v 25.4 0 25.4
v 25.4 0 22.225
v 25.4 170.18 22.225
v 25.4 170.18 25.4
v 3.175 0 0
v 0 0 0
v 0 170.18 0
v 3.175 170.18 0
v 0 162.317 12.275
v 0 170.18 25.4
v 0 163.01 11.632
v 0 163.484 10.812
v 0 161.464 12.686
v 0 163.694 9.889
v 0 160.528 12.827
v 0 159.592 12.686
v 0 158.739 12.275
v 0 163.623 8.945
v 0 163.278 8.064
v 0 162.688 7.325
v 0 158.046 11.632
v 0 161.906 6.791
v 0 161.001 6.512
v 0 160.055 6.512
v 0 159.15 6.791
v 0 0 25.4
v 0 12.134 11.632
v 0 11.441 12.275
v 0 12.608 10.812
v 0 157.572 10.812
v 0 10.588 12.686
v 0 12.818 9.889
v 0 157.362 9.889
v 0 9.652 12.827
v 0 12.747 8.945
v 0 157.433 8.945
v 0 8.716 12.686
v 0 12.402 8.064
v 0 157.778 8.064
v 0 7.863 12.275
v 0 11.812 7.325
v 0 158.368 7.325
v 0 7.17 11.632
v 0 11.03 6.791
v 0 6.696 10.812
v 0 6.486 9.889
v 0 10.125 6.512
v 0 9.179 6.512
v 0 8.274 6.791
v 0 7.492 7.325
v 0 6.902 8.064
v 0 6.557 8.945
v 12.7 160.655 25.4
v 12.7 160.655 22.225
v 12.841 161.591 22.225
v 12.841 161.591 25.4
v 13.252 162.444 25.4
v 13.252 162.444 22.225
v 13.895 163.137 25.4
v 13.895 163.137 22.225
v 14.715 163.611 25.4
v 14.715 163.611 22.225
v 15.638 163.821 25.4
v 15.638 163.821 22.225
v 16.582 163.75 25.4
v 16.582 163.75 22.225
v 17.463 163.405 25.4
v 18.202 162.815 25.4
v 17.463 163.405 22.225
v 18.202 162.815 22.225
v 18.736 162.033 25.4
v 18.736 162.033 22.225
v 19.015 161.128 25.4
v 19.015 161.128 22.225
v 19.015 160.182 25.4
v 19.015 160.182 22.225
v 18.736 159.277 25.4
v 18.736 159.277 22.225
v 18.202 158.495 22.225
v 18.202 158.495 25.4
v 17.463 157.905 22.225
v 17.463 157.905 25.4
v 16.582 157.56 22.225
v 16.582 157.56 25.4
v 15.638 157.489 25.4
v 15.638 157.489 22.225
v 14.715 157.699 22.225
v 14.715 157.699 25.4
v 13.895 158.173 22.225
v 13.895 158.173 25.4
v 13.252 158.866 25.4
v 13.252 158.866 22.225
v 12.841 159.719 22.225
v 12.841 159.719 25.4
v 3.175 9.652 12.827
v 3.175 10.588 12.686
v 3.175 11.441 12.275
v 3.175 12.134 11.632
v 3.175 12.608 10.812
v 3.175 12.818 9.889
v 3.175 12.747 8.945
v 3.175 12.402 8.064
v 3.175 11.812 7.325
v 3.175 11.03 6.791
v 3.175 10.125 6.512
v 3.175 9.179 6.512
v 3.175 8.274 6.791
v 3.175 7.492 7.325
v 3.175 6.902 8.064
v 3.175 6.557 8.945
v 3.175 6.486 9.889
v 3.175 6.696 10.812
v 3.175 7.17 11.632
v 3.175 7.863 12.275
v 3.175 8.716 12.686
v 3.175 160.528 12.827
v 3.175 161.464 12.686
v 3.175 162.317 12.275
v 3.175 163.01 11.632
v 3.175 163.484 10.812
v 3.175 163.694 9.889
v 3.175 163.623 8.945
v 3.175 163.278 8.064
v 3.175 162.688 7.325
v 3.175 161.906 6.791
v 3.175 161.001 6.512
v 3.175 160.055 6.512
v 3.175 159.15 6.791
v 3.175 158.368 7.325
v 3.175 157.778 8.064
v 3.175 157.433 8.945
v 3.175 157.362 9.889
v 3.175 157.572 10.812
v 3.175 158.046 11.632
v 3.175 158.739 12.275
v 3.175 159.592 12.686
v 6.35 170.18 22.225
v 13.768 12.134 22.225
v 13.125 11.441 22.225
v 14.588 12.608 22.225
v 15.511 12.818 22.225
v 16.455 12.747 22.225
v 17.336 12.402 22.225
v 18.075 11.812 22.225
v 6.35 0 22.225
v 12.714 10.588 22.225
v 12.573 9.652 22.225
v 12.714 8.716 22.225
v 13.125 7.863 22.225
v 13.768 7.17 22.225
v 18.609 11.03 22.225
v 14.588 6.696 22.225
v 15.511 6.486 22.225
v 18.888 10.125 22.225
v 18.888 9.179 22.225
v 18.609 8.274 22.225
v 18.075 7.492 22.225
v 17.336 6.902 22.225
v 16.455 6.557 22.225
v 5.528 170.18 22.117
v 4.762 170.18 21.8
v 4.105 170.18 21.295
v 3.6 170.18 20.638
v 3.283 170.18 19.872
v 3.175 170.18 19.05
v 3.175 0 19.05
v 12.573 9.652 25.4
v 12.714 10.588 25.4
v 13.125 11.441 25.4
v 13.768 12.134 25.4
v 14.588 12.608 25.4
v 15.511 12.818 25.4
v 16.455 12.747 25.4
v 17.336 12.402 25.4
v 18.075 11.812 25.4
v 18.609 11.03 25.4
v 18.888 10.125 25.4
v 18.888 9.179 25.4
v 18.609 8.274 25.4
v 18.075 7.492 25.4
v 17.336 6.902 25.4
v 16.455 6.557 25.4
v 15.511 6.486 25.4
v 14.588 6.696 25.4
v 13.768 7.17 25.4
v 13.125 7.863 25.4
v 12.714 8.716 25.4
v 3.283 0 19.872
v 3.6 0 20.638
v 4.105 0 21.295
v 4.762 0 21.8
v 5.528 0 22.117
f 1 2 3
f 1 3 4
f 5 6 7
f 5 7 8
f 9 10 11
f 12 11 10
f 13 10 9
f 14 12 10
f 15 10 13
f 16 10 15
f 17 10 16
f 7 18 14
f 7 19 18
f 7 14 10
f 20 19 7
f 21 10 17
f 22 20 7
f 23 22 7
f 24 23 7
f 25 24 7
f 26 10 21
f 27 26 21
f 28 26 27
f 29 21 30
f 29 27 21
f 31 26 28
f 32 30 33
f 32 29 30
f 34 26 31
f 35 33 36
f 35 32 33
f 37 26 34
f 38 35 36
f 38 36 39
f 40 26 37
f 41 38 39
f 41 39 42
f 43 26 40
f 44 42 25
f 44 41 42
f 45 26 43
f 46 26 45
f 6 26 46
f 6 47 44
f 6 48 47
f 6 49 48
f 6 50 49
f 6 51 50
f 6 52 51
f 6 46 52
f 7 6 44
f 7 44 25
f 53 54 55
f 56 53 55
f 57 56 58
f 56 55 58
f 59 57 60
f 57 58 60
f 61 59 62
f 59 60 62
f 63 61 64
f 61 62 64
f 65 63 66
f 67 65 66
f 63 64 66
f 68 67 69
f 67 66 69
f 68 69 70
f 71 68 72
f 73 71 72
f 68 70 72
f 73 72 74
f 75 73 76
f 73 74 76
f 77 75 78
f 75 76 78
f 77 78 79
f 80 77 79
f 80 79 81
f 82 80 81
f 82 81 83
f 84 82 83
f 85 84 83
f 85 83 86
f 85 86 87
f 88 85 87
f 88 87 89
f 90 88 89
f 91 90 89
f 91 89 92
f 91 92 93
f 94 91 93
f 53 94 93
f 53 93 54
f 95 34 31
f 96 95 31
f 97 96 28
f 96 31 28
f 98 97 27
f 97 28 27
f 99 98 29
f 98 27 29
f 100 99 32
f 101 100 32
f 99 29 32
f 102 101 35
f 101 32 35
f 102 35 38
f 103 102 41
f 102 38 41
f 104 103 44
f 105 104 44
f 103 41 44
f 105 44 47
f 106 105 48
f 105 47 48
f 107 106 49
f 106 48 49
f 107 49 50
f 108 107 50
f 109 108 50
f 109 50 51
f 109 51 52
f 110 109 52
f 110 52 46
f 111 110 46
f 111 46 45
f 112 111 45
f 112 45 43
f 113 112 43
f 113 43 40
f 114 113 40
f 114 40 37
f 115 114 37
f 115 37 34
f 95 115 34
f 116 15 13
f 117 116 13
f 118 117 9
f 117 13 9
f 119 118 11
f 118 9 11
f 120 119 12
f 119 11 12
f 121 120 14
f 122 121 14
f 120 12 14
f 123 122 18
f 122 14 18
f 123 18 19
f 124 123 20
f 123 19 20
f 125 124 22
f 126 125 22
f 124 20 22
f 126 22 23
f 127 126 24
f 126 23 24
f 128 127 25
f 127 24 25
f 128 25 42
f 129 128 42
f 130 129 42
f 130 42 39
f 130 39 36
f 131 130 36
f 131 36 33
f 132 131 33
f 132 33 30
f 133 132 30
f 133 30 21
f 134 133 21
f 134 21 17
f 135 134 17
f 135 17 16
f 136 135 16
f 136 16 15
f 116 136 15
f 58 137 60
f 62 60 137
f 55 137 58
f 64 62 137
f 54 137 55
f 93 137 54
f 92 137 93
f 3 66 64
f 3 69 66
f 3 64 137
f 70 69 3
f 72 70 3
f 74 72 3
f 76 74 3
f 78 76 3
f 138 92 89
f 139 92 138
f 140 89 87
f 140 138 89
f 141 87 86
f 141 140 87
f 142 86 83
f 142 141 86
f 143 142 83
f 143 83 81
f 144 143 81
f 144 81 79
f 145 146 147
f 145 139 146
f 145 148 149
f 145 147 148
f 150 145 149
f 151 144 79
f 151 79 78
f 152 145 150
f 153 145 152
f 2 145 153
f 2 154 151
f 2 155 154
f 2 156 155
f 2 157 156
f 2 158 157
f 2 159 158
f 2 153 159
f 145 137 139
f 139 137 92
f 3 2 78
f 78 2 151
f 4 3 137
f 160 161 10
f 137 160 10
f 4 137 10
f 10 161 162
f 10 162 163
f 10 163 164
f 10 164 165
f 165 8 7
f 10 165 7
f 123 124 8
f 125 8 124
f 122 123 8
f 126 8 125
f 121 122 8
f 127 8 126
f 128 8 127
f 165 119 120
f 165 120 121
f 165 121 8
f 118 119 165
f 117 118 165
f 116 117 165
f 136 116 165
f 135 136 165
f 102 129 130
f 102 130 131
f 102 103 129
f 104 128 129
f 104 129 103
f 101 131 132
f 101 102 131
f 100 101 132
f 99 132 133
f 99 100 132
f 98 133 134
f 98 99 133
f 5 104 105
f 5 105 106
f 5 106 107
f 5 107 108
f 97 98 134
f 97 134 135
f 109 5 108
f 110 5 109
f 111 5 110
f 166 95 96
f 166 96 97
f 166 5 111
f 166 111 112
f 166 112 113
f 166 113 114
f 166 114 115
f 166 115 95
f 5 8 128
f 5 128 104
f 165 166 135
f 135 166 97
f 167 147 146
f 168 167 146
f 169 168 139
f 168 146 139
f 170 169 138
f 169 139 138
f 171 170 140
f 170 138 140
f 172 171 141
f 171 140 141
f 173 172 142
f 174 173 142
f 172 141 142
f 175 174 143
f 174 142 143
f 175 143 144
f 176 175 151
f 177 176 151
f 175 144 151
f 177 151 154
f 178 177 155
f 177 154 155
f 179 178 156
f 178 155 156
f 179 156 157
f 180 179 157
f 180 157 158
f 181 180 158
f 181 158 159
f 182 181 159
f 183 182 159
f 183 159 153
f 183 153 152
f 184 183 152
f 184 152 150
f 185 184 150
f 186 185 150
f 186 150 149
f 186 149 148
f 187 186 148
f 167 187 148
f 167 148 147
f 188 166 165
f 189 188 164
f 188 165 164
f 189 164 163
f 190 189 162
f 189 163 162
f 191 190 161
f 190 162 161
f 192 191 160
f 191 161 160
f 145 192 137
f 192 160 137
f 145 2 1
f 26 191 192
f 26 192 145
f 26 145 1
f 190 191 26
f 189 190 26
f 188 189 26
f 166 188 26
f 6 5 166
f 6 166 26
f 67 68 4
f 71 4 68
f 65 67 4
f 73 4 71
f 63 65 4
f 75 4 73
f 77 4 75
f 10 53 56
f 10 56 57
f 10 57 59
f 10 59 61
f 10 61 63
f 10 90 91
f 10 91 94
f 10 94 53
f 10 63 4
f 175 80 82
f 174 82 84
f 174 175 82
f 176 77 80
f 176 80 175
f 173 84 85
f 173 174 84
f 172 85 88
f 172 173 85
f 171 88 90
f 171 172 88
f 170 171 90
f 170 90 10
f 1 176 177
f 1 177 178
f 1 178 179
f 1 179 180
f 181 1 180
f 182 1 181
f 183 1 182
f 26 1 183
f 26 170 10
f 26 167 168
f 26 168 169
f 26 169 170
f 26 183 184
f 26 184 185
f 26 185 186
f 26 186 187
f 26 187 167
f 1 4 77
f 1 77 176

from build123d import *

# Parameters (mm, degrees)
BOSS_EXTRUDE1_DEPTH = 170.18
FILLET1_R           = 3.175
SKETCH2_R           = 3.175
CUT_EXTRUDE1_DEPTH  = 174.929734088
SKETCH3_R           = 3.175
CUT_EXTRUDE2_DEPTH  = 174.929734088
SKETCH4_R           = 3.175
CUT_EXTRUDE3_DEPTH  = 174.494504308
SKETCH5_R           = 3.175
CUT_EXTRUDE4_DEPTH  = 174.494504308


with BuildPart() as part:
    # Sketch1 → Boss-Extrude1 (new body)
    with BuildSketch(Plane(origin=(0, 0, 0), x_dir=(1, 0, 0), z_dir=(0, 1, 0))):
        Polygon((0, 0), (3.175, 0), (3.175, -22.225), (25.4, -22.225), (25.4, -25.4), (0, -25.4), align=None)
    extrude(amount=BOSS_EXTRUDE1_DEPTH)

    # Fillet1
    fillet1_edges = [part.edges().sort_by_distance(p)[0] for p in [
        (3.175, 85.09, 22.225),
    ]]
    fillet(fillet1_edges, radius=FILLET1_R)

    # Sketch2 → Cut-Extrude1 (cut, through all)
    with BuildSketch(Plane.ZY):
        with Locations((9.652, 160.528)):
            Circle(SKETCH2_R)
    extrude(amount=-CUT_EXTRUDE1_DEPTH, mode=Mode.SUBTRACT)

    # Sketch3 → Cut-Extrude2 (cut, through all)
    with BuildSketch(Plane.ZY):
        with Locations((9.652, 9.652)):
            Circle(SKETCH3_R)
    extrude(amount=-CUT_EXTRUDE2_DEPTH, mode=Mode.SUBTRACT)

    # Sketch4 → Cut-Extrude3 (cut, through all)
    with BuildSketch(Plane(origin=(0, 0, 22.225), x_dir=(-1, 0, 0), z_dir=(0, 0, -1))):
        with Locations((-15.748, 9.652)):
            Circle(SKETCH4_R)
    extrude(amount=-CUT_EXTRUDE3_DEPTH, mode=Mode.SUBTRACT)

    # Sketch5 → Cut-Extrude4 (cut, through all)
    with BuildSketch(Plane(origin=(0, 0, 22.225), x_dir=(-1, 0, 0), z_dir=(0, 0, -1))):
        with Locations((-15.875, 160.655)):
            Circle(SKETCH5_R)
    extrude(amount=-CUT_EXTRUDE4_DEPTH, mode=Mode.SUBTRACT)


solid = part.part
